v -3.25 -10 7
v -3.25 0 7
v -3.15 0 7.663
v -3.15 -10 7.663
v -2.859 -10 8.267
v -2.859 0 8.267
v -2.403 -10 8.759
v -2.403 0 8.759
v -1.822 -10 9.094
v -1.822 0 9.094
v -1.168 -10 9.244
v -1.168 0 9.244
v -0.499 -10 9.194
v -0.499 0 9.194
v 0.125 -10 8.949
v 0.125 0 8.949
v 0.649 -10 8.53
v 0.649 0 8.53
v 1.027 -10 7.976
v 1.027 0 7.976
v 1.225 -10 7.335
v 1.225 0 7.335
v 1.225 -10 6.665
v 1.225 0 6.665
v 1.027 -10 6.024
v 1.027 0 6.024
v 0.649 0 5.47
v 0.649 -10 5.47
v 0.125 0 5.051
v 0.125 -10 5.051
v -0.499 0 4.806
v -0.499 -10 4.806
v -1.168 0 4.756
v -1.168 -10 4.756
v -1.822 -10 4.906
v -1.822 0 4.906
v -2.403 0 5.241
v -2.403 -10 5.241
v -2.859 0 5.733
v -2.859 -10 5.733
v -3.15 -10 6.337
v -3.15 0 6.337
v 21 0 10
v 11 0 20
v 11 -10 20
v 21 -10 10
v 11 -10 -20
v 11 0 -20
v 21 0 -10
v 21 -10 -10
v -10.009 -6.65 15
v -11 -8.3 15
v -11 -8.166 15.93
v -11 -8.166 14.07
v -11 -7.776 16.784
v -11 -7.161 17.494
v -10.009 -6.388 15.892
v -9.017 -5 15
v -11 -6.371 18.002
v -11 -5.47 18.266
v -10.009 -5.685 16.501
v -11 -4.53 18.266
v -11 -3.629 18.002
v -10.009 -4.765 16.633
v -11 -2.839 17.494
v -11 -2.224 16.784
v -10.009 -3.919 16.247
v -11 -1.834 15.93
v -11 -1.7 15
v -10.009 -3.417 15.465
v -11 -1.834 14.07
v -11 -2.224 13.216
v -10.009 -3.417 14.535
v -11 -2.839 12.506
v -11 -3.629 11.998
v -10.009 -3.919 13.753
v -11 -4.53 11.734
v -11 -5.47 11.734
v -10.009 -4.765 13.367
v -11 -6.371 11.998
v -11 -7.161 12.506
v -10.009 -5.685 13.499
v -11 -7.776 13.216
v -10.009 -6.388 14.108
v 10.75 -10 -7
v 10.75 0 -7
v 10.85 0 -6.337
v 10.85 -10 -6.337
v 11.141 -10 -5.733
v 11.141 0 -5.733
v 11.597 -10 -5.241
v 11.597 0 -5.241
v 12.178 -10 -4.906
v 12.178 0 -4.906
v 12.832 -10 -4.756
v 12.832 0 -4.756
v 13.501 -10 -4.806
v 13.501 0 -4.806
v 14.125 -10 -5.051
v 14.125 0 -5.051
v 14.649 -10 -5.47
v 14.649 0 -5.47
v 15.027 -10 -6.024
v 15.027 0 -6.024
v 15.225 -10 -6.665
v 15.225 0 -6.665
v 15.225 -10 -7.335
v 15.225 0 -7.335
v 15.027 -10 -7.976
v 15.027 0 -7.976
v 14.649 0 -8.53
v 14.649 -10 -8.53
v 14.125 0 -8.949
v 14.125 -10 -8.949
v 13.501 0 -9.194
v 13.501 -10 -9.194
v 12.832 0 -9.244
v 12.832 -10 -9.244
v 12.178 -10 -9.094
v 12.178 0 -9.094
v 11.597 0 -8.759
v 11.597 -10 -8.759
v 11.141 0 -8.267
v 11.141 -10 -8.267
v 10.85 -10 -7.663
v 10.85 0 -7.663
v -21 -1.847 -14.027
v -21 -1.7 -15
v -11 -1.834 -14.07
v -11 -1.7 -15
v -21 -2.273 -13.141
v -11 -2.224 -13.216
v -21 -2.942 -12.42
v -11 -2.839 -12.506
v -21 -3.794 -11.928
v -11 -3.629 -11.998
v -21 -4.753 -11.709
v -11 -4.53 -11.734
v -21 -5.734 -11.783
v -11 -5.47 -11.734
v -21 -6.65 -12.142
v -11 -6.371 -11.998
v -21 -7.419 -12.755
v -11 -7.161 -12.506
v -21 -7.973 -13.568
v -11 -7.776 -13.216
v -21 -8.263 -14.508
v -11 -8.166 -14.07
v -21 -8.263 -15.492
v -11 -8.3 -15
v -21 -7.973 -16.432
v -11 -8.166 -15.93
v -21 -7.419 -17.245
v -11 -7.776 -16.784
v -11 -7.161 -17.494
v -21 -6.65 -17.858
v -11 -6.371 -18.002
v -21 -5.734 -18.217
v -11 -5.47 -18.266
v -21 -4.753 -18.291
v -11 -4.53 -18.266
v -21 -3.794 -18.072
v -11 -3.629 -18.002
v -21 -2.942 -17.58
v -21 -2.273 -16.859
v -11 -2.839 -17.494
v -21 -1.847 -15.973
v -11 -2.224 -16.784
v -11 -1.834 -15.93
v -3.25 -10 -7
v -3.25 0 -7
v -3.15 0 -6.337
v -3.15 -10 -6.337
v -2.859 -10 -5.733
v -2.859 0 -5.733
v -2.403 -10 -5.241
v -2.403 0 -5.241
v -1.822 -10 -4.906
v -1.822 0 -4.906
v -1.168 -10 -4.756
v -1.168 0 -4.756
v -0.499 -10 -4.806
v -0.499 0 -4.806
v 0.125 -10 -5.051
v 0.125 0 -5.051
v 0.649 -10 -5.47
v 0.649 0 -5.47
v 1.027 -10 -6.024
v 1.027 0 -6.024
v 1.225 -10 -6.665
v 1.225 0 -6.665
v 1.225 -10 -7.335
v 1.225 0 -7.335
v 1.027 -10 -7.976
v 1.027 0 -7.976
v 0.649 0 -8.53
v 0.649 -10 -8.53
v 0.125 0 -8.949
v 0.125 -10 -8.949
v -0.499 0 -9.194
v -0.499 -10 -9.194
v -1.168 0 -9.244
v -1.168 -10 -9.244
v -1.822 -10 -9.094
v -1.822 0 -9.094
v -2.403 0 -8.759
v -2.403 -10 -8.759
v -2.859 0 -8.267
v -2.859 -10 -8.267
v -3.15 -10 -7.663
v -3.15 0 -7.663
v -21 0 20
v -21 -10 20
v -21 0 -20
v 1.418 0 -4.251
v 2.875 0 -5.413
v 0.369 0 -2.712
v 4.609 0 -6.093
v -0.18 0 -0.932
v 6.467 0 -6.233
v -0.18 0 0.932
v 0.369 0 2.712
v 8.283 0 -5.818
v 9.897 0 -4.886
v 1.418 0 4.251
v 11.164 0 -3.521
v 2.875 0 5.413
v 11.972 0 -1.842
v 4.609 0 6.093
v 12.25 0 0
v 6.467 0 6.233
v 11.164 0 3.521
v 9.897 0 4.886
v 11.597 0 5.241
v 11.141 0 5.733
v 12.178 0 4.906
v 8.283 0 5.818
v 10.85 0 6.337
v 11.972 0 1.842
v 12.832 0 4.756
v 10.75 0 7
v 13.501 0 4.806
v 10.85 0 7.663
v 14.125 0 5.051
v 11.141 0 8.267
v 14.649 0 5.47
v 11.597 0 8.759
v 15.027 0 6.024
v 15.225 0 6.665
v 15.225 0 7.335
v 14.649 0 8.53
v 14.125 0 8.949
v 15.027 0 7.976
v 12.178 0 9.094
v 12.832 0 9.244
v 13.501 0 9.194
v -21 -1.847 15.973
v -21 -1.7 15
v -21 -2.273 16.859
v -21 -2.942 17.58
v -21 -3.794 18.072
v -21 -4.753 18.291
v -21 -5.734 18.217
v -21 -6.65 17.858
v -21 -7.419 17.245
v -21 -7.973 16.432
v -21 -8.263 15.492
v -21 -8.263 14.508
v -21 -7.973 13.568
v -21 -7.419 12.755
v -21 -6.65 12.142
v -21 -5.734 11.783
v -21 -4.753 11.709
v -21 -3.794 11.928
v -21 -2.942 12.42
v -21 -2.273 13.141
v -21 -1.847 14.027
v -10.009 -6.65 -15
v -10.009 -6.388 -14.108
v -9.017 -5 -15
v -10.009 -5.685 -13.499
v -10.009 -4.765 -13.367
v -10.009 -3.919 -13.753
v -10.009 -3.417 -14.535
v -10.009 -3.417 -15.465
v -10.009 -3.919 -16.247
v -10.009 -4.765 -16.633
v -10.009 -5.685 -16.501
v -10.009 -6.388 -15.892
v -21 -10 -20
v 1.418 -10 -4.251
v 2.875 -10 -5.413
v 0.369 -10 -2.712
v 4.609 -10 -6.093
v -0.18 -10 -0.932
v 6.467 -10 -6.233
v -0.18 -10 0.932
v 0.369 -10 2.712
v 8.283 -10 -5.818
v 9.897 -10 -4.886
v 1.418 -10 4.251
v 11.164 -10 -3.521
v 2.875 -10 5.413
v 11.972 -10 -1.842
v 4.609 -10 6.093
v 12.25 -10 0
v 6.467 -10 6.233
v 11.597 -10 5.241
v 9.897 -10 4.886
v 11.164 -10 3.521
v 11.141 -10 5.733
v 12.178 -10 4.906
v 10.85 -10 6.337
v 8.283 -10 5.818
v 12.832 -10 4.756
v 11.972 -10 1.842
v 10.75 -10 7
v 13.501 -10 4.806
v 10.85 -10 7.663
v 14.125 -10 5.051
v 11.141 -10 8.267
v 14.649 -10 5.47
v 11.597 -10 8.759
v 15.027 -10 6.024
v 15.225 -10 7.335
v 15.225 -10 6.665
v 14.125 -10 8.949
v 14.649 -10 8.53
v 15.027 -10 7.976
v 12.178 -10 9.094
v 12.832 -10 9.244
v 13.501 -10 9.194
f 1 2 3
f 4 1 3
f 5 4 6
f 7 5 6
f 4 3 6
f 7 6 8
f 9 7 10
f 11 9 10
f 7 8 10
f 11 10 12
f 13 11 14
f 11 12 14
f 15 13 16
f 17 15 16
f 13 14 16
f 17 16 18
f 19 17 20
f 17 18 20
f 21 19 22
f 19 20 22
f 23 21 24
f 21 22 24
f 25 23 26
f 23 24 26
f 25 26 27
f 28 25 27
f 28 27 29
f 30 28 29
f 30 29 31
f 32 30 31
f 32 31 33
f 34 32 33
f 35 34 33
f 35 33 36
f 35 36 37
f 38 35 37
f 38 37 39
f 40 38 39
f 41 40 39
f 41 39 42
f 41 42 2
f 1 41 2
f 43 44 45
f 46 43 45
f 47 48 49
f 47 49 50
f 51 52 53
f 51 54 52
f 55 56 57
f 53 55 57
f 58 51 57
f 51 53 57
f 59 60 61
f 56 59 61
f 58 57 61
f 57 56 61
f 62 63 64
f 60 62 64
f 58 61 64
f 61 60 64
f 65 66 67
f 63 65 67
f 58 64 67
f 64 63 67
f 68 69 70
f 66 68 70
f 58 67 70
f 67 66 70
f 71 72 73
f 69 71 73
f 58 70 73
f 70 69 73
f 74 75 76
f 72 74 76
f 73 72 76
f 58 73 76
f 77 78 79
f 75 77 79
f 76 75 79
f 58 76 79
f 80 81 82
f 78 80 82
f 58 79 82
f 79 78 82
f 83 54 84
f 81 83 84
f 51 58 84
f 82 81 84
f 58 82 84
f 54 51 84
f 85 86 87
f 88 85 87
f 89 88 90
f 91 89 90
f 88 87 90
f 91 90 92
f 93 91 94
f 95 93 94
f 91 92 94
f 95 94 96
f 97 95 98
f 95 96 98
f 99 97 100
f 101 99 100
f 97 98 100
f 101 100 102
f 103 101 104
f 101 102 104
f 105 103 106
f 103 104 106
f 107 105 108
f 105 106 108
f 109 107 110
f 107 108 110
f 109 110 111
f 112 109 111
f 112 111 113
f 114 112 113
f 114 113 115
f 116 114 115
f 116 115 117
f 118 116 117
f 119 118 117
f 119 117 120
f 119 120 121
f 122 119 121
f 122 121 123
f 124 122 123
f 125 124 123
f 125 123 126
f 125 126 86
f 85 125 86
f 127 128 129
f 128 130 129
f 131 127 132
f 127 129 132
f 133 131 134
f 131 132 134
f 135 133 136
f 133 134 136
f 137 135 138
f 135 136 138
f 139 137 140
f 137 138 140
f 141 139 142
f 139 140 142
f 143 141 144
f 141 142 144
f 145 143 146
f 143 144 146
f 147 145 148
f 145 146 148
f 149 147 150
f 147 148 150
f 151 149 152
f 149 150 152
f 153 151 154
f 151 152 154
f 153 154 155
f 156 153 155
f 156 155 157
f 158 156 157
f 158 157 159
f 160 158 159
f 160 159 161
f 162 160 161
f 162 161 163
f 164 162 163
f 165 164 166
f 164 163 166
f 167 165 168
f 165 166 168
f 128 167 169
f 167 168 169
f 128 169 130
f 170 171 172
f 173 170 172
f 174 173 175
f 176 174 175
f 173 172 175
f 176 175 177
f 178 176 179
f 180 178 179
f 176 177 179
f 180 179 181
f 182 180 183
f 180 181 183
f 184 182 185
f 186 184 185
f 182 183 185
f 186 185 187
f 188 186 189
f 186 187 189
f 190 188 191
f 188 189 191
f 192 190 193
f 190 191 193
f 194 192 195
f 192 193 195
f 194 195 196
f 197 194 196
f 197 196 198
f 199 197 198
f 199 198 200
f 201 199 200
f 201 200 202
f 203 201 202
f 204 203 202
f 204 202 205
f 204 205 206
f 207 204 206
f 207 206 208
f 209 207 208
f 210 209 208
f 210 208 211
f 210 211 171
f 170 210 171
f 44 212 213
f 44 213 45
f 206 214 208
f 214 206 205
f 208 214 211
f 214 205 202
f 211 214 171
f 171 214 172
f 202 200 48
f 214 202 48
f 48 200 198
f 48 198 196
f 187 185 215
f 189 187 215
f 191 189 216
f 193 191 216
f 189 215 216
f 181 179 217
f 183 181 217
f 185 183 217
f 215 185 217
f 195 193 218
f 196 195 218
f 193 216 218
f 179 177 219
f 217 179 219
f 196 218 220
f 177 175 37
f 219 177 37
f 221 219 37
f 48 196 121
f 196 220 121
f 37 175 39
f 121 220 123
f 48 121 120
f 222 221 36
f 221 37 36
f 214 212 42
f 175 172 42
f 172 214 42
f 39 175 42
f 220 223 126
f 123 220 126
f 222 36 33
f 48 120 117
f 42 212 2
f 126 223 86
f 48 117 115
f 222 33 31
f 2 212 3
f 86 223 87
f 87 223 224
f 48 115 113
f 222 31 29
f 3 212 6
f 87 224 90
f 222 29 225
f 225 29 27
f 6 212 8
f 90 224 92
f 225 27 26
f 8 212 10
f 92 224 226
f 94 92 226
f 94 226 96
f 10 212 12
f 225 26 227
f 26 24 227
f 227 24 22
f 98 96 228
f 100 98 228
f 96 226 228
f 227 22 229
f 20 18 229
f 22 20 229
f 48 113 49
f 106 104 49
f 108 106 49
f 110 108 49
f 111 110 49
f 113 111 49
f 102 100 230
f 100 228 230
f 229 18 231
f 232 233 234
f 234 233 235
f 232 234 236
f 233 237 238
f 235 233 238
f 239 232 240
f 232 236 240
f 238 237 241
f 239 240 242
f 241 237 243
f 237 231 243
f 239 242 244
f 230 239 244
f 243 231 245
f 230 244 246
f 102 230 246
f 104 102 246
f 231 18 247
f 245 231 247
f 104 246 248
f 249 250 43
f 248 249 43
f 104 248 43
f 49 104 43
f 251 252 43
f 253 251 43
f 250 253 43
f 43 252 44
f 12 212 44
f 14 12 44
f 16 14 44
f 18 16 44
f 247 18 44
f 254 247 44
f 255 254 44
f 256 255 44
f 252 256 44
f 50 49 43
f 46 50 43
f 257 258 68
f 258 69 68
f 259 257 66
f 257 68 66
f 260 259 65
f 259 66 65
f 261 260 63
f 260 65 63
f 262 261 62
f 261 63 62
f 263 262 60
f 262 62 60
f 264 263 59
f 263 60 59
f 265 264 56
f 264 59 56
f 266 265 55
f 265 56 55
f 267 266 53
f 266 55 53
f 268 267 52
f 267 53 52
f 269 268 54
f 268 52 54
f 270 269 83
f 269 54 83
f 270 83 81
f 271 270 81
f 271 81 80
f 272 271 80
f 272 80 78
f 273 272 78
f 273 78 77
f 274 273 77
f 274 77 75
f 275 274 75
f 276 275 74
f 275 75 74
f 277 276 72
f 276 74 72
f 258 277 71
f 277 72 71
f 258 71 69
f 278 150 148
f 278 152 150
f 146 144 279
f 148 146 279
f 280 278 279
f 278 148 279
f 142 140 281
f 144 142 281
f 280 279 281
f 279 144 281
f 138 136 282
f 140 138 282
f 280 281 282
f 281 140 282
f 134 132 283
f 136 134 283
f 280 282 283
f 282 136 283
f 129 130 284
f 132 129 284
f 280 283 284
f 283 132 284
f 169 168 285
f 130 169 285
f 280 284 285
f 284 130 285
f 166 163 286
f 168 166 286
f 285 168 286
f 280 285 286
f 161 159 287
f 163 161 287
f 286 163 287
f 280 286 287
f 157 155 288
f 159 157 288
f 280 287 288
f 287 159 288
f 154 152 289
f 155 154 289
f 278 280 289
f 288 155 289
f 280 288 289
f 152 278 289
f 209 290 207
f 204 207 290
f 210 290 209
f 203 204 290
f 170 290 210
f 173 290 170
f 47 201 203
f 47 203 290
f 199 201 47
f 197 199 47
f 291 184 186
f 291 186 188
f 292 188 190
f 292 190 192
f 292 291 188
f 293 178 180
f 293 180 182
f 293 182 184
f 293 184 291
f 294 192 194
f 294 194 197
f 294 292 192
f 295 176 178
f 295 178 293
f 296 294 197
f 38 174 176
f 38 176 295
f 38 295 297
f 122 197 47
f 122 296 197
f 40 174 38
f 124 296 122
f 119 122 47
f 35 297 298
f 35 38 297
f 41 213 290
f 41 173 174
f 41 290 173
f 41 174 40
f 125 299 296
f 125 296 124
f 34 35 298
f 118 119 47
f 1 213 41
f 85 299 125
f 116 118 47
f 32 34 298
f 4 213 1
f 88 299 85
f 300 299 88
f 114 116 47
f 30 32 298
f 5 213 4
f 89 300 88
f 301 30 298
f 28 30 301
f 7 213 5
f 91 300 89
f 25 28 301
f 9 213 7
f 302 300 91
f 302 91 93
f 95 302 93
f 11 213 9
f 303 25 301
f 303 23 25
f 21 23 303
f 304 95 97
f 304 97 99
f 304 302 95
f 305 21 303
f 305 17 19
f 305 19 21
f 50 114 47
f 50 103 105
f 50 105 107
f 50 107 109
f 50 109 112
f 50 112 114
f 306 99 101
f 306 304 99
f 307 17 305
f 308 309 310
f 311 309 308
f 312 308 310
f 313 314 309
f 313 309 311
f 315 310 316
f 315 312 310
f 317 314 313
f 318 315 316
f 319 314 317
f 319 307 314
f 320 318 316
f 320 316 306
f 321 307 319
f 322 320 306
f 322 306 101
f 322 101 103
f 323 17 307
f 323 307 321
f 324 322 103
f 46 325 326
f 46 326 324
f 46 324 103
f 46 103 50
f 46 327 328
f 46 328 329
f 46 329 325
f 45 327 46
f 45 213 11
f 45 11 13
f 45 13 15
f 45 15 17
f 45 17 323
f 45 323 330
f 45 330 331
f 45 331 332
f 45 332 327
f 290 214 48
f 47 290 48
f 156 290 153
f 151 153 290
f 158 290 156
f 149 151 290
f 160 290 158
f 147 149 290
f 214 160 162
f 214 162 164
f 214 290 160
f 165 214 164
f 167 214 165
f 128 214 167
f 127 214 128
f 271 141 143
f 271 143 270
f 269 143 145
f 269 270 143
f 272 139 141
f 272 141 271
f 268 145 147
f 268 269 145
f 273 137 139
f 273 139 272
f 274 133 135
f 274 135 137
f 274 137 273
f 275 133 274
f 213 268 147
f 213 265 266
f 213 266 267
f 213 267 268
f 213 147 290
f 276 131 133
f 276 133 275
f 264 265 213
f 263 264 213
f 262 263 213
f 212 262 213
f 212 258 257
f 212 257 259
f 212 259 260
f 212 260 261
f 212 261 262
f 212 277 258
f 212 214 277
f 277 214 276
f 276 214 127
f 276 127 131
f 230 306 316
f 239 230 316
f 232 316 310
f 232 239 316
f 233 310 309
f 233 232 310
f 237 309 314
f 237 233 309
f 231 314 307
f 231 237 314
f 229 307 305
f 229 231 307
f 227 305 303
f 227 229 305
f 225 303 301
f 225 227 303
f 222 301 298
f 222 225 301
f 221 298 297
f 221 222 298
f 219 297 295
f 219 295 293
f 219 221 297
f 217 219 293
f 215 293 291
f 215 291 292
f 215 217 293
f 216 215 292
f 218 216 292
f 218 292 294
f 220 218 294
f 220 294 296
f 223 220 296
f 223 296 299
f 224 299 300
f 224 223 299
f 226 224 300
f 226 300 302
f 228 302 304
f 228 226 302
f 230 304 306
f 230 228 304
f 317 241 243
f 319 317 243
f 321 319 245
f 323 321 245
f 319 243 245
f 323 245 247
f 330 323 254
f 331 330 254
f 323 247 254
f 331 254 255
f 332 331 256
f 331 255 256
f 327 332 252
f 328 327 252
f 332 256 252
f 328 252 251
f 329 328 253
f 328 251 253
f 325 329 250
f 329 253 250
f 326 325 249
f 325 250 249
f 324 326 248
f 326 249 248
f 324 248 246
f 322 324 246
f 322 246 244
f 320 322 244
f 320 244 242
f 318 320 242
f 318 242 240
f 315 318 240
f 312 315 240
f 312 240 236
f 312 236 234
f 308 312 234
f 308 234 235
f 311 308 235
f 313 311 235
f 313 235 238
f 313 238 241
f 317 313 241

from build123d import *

# Parameters (mm, degrees)
F0_W     = 42
F0_H     = 40
F0_R     = 6.25
F1_DEPTH = 10
F2_SIZE  = 10
F4_D     = 4.5
F6_D     = 6.6
F6_DEPTH = 10
F6_TIP   = 1.9828400428


with BuildPart() as f1:
    # F0 (on Front) → F1 (new body)
    with BuildSketch(Plane.XZ):
        Rectangle(F0_W, F0_H)
        with Locations((6, 0)):
            Circle(F0_R, mode=Mode.SUBTRACT)
    extrude(amount=F1_DEPTH)

    # F2
    f2_edges = [f1.edges().sort_by_distance(p)[0] for p in [
        (21, -5, 20),
        (21, -5, -20),
    ]]
    chamfer(f2_edges, length=F2_SIZE)

    # F4 (through all)
    with Locations(Plane.XZ.offset(10)):
        with Locations((-1, 7), (-1, -7), (13, -7), (13, 7)):
            Hole(F4_D / 2)

    # F6
    with Locations(Plane(origin=(-21, 0, 0), x_dir=(0, -1, 0), z_dir=(-1, 0, 0))):
        with Locations((5, 15), (5, -15)):
            Hole(F6_D / 2, depth=F6_DEPTH)
            with Locations((0, 0, -(F6_DEPTH + F6_TIP / 2))):  # 118° drill point
                Cone(0, F6_D / 2, F6_TIP, mode=Mode.SUBTRACT)


solid = f1.part
